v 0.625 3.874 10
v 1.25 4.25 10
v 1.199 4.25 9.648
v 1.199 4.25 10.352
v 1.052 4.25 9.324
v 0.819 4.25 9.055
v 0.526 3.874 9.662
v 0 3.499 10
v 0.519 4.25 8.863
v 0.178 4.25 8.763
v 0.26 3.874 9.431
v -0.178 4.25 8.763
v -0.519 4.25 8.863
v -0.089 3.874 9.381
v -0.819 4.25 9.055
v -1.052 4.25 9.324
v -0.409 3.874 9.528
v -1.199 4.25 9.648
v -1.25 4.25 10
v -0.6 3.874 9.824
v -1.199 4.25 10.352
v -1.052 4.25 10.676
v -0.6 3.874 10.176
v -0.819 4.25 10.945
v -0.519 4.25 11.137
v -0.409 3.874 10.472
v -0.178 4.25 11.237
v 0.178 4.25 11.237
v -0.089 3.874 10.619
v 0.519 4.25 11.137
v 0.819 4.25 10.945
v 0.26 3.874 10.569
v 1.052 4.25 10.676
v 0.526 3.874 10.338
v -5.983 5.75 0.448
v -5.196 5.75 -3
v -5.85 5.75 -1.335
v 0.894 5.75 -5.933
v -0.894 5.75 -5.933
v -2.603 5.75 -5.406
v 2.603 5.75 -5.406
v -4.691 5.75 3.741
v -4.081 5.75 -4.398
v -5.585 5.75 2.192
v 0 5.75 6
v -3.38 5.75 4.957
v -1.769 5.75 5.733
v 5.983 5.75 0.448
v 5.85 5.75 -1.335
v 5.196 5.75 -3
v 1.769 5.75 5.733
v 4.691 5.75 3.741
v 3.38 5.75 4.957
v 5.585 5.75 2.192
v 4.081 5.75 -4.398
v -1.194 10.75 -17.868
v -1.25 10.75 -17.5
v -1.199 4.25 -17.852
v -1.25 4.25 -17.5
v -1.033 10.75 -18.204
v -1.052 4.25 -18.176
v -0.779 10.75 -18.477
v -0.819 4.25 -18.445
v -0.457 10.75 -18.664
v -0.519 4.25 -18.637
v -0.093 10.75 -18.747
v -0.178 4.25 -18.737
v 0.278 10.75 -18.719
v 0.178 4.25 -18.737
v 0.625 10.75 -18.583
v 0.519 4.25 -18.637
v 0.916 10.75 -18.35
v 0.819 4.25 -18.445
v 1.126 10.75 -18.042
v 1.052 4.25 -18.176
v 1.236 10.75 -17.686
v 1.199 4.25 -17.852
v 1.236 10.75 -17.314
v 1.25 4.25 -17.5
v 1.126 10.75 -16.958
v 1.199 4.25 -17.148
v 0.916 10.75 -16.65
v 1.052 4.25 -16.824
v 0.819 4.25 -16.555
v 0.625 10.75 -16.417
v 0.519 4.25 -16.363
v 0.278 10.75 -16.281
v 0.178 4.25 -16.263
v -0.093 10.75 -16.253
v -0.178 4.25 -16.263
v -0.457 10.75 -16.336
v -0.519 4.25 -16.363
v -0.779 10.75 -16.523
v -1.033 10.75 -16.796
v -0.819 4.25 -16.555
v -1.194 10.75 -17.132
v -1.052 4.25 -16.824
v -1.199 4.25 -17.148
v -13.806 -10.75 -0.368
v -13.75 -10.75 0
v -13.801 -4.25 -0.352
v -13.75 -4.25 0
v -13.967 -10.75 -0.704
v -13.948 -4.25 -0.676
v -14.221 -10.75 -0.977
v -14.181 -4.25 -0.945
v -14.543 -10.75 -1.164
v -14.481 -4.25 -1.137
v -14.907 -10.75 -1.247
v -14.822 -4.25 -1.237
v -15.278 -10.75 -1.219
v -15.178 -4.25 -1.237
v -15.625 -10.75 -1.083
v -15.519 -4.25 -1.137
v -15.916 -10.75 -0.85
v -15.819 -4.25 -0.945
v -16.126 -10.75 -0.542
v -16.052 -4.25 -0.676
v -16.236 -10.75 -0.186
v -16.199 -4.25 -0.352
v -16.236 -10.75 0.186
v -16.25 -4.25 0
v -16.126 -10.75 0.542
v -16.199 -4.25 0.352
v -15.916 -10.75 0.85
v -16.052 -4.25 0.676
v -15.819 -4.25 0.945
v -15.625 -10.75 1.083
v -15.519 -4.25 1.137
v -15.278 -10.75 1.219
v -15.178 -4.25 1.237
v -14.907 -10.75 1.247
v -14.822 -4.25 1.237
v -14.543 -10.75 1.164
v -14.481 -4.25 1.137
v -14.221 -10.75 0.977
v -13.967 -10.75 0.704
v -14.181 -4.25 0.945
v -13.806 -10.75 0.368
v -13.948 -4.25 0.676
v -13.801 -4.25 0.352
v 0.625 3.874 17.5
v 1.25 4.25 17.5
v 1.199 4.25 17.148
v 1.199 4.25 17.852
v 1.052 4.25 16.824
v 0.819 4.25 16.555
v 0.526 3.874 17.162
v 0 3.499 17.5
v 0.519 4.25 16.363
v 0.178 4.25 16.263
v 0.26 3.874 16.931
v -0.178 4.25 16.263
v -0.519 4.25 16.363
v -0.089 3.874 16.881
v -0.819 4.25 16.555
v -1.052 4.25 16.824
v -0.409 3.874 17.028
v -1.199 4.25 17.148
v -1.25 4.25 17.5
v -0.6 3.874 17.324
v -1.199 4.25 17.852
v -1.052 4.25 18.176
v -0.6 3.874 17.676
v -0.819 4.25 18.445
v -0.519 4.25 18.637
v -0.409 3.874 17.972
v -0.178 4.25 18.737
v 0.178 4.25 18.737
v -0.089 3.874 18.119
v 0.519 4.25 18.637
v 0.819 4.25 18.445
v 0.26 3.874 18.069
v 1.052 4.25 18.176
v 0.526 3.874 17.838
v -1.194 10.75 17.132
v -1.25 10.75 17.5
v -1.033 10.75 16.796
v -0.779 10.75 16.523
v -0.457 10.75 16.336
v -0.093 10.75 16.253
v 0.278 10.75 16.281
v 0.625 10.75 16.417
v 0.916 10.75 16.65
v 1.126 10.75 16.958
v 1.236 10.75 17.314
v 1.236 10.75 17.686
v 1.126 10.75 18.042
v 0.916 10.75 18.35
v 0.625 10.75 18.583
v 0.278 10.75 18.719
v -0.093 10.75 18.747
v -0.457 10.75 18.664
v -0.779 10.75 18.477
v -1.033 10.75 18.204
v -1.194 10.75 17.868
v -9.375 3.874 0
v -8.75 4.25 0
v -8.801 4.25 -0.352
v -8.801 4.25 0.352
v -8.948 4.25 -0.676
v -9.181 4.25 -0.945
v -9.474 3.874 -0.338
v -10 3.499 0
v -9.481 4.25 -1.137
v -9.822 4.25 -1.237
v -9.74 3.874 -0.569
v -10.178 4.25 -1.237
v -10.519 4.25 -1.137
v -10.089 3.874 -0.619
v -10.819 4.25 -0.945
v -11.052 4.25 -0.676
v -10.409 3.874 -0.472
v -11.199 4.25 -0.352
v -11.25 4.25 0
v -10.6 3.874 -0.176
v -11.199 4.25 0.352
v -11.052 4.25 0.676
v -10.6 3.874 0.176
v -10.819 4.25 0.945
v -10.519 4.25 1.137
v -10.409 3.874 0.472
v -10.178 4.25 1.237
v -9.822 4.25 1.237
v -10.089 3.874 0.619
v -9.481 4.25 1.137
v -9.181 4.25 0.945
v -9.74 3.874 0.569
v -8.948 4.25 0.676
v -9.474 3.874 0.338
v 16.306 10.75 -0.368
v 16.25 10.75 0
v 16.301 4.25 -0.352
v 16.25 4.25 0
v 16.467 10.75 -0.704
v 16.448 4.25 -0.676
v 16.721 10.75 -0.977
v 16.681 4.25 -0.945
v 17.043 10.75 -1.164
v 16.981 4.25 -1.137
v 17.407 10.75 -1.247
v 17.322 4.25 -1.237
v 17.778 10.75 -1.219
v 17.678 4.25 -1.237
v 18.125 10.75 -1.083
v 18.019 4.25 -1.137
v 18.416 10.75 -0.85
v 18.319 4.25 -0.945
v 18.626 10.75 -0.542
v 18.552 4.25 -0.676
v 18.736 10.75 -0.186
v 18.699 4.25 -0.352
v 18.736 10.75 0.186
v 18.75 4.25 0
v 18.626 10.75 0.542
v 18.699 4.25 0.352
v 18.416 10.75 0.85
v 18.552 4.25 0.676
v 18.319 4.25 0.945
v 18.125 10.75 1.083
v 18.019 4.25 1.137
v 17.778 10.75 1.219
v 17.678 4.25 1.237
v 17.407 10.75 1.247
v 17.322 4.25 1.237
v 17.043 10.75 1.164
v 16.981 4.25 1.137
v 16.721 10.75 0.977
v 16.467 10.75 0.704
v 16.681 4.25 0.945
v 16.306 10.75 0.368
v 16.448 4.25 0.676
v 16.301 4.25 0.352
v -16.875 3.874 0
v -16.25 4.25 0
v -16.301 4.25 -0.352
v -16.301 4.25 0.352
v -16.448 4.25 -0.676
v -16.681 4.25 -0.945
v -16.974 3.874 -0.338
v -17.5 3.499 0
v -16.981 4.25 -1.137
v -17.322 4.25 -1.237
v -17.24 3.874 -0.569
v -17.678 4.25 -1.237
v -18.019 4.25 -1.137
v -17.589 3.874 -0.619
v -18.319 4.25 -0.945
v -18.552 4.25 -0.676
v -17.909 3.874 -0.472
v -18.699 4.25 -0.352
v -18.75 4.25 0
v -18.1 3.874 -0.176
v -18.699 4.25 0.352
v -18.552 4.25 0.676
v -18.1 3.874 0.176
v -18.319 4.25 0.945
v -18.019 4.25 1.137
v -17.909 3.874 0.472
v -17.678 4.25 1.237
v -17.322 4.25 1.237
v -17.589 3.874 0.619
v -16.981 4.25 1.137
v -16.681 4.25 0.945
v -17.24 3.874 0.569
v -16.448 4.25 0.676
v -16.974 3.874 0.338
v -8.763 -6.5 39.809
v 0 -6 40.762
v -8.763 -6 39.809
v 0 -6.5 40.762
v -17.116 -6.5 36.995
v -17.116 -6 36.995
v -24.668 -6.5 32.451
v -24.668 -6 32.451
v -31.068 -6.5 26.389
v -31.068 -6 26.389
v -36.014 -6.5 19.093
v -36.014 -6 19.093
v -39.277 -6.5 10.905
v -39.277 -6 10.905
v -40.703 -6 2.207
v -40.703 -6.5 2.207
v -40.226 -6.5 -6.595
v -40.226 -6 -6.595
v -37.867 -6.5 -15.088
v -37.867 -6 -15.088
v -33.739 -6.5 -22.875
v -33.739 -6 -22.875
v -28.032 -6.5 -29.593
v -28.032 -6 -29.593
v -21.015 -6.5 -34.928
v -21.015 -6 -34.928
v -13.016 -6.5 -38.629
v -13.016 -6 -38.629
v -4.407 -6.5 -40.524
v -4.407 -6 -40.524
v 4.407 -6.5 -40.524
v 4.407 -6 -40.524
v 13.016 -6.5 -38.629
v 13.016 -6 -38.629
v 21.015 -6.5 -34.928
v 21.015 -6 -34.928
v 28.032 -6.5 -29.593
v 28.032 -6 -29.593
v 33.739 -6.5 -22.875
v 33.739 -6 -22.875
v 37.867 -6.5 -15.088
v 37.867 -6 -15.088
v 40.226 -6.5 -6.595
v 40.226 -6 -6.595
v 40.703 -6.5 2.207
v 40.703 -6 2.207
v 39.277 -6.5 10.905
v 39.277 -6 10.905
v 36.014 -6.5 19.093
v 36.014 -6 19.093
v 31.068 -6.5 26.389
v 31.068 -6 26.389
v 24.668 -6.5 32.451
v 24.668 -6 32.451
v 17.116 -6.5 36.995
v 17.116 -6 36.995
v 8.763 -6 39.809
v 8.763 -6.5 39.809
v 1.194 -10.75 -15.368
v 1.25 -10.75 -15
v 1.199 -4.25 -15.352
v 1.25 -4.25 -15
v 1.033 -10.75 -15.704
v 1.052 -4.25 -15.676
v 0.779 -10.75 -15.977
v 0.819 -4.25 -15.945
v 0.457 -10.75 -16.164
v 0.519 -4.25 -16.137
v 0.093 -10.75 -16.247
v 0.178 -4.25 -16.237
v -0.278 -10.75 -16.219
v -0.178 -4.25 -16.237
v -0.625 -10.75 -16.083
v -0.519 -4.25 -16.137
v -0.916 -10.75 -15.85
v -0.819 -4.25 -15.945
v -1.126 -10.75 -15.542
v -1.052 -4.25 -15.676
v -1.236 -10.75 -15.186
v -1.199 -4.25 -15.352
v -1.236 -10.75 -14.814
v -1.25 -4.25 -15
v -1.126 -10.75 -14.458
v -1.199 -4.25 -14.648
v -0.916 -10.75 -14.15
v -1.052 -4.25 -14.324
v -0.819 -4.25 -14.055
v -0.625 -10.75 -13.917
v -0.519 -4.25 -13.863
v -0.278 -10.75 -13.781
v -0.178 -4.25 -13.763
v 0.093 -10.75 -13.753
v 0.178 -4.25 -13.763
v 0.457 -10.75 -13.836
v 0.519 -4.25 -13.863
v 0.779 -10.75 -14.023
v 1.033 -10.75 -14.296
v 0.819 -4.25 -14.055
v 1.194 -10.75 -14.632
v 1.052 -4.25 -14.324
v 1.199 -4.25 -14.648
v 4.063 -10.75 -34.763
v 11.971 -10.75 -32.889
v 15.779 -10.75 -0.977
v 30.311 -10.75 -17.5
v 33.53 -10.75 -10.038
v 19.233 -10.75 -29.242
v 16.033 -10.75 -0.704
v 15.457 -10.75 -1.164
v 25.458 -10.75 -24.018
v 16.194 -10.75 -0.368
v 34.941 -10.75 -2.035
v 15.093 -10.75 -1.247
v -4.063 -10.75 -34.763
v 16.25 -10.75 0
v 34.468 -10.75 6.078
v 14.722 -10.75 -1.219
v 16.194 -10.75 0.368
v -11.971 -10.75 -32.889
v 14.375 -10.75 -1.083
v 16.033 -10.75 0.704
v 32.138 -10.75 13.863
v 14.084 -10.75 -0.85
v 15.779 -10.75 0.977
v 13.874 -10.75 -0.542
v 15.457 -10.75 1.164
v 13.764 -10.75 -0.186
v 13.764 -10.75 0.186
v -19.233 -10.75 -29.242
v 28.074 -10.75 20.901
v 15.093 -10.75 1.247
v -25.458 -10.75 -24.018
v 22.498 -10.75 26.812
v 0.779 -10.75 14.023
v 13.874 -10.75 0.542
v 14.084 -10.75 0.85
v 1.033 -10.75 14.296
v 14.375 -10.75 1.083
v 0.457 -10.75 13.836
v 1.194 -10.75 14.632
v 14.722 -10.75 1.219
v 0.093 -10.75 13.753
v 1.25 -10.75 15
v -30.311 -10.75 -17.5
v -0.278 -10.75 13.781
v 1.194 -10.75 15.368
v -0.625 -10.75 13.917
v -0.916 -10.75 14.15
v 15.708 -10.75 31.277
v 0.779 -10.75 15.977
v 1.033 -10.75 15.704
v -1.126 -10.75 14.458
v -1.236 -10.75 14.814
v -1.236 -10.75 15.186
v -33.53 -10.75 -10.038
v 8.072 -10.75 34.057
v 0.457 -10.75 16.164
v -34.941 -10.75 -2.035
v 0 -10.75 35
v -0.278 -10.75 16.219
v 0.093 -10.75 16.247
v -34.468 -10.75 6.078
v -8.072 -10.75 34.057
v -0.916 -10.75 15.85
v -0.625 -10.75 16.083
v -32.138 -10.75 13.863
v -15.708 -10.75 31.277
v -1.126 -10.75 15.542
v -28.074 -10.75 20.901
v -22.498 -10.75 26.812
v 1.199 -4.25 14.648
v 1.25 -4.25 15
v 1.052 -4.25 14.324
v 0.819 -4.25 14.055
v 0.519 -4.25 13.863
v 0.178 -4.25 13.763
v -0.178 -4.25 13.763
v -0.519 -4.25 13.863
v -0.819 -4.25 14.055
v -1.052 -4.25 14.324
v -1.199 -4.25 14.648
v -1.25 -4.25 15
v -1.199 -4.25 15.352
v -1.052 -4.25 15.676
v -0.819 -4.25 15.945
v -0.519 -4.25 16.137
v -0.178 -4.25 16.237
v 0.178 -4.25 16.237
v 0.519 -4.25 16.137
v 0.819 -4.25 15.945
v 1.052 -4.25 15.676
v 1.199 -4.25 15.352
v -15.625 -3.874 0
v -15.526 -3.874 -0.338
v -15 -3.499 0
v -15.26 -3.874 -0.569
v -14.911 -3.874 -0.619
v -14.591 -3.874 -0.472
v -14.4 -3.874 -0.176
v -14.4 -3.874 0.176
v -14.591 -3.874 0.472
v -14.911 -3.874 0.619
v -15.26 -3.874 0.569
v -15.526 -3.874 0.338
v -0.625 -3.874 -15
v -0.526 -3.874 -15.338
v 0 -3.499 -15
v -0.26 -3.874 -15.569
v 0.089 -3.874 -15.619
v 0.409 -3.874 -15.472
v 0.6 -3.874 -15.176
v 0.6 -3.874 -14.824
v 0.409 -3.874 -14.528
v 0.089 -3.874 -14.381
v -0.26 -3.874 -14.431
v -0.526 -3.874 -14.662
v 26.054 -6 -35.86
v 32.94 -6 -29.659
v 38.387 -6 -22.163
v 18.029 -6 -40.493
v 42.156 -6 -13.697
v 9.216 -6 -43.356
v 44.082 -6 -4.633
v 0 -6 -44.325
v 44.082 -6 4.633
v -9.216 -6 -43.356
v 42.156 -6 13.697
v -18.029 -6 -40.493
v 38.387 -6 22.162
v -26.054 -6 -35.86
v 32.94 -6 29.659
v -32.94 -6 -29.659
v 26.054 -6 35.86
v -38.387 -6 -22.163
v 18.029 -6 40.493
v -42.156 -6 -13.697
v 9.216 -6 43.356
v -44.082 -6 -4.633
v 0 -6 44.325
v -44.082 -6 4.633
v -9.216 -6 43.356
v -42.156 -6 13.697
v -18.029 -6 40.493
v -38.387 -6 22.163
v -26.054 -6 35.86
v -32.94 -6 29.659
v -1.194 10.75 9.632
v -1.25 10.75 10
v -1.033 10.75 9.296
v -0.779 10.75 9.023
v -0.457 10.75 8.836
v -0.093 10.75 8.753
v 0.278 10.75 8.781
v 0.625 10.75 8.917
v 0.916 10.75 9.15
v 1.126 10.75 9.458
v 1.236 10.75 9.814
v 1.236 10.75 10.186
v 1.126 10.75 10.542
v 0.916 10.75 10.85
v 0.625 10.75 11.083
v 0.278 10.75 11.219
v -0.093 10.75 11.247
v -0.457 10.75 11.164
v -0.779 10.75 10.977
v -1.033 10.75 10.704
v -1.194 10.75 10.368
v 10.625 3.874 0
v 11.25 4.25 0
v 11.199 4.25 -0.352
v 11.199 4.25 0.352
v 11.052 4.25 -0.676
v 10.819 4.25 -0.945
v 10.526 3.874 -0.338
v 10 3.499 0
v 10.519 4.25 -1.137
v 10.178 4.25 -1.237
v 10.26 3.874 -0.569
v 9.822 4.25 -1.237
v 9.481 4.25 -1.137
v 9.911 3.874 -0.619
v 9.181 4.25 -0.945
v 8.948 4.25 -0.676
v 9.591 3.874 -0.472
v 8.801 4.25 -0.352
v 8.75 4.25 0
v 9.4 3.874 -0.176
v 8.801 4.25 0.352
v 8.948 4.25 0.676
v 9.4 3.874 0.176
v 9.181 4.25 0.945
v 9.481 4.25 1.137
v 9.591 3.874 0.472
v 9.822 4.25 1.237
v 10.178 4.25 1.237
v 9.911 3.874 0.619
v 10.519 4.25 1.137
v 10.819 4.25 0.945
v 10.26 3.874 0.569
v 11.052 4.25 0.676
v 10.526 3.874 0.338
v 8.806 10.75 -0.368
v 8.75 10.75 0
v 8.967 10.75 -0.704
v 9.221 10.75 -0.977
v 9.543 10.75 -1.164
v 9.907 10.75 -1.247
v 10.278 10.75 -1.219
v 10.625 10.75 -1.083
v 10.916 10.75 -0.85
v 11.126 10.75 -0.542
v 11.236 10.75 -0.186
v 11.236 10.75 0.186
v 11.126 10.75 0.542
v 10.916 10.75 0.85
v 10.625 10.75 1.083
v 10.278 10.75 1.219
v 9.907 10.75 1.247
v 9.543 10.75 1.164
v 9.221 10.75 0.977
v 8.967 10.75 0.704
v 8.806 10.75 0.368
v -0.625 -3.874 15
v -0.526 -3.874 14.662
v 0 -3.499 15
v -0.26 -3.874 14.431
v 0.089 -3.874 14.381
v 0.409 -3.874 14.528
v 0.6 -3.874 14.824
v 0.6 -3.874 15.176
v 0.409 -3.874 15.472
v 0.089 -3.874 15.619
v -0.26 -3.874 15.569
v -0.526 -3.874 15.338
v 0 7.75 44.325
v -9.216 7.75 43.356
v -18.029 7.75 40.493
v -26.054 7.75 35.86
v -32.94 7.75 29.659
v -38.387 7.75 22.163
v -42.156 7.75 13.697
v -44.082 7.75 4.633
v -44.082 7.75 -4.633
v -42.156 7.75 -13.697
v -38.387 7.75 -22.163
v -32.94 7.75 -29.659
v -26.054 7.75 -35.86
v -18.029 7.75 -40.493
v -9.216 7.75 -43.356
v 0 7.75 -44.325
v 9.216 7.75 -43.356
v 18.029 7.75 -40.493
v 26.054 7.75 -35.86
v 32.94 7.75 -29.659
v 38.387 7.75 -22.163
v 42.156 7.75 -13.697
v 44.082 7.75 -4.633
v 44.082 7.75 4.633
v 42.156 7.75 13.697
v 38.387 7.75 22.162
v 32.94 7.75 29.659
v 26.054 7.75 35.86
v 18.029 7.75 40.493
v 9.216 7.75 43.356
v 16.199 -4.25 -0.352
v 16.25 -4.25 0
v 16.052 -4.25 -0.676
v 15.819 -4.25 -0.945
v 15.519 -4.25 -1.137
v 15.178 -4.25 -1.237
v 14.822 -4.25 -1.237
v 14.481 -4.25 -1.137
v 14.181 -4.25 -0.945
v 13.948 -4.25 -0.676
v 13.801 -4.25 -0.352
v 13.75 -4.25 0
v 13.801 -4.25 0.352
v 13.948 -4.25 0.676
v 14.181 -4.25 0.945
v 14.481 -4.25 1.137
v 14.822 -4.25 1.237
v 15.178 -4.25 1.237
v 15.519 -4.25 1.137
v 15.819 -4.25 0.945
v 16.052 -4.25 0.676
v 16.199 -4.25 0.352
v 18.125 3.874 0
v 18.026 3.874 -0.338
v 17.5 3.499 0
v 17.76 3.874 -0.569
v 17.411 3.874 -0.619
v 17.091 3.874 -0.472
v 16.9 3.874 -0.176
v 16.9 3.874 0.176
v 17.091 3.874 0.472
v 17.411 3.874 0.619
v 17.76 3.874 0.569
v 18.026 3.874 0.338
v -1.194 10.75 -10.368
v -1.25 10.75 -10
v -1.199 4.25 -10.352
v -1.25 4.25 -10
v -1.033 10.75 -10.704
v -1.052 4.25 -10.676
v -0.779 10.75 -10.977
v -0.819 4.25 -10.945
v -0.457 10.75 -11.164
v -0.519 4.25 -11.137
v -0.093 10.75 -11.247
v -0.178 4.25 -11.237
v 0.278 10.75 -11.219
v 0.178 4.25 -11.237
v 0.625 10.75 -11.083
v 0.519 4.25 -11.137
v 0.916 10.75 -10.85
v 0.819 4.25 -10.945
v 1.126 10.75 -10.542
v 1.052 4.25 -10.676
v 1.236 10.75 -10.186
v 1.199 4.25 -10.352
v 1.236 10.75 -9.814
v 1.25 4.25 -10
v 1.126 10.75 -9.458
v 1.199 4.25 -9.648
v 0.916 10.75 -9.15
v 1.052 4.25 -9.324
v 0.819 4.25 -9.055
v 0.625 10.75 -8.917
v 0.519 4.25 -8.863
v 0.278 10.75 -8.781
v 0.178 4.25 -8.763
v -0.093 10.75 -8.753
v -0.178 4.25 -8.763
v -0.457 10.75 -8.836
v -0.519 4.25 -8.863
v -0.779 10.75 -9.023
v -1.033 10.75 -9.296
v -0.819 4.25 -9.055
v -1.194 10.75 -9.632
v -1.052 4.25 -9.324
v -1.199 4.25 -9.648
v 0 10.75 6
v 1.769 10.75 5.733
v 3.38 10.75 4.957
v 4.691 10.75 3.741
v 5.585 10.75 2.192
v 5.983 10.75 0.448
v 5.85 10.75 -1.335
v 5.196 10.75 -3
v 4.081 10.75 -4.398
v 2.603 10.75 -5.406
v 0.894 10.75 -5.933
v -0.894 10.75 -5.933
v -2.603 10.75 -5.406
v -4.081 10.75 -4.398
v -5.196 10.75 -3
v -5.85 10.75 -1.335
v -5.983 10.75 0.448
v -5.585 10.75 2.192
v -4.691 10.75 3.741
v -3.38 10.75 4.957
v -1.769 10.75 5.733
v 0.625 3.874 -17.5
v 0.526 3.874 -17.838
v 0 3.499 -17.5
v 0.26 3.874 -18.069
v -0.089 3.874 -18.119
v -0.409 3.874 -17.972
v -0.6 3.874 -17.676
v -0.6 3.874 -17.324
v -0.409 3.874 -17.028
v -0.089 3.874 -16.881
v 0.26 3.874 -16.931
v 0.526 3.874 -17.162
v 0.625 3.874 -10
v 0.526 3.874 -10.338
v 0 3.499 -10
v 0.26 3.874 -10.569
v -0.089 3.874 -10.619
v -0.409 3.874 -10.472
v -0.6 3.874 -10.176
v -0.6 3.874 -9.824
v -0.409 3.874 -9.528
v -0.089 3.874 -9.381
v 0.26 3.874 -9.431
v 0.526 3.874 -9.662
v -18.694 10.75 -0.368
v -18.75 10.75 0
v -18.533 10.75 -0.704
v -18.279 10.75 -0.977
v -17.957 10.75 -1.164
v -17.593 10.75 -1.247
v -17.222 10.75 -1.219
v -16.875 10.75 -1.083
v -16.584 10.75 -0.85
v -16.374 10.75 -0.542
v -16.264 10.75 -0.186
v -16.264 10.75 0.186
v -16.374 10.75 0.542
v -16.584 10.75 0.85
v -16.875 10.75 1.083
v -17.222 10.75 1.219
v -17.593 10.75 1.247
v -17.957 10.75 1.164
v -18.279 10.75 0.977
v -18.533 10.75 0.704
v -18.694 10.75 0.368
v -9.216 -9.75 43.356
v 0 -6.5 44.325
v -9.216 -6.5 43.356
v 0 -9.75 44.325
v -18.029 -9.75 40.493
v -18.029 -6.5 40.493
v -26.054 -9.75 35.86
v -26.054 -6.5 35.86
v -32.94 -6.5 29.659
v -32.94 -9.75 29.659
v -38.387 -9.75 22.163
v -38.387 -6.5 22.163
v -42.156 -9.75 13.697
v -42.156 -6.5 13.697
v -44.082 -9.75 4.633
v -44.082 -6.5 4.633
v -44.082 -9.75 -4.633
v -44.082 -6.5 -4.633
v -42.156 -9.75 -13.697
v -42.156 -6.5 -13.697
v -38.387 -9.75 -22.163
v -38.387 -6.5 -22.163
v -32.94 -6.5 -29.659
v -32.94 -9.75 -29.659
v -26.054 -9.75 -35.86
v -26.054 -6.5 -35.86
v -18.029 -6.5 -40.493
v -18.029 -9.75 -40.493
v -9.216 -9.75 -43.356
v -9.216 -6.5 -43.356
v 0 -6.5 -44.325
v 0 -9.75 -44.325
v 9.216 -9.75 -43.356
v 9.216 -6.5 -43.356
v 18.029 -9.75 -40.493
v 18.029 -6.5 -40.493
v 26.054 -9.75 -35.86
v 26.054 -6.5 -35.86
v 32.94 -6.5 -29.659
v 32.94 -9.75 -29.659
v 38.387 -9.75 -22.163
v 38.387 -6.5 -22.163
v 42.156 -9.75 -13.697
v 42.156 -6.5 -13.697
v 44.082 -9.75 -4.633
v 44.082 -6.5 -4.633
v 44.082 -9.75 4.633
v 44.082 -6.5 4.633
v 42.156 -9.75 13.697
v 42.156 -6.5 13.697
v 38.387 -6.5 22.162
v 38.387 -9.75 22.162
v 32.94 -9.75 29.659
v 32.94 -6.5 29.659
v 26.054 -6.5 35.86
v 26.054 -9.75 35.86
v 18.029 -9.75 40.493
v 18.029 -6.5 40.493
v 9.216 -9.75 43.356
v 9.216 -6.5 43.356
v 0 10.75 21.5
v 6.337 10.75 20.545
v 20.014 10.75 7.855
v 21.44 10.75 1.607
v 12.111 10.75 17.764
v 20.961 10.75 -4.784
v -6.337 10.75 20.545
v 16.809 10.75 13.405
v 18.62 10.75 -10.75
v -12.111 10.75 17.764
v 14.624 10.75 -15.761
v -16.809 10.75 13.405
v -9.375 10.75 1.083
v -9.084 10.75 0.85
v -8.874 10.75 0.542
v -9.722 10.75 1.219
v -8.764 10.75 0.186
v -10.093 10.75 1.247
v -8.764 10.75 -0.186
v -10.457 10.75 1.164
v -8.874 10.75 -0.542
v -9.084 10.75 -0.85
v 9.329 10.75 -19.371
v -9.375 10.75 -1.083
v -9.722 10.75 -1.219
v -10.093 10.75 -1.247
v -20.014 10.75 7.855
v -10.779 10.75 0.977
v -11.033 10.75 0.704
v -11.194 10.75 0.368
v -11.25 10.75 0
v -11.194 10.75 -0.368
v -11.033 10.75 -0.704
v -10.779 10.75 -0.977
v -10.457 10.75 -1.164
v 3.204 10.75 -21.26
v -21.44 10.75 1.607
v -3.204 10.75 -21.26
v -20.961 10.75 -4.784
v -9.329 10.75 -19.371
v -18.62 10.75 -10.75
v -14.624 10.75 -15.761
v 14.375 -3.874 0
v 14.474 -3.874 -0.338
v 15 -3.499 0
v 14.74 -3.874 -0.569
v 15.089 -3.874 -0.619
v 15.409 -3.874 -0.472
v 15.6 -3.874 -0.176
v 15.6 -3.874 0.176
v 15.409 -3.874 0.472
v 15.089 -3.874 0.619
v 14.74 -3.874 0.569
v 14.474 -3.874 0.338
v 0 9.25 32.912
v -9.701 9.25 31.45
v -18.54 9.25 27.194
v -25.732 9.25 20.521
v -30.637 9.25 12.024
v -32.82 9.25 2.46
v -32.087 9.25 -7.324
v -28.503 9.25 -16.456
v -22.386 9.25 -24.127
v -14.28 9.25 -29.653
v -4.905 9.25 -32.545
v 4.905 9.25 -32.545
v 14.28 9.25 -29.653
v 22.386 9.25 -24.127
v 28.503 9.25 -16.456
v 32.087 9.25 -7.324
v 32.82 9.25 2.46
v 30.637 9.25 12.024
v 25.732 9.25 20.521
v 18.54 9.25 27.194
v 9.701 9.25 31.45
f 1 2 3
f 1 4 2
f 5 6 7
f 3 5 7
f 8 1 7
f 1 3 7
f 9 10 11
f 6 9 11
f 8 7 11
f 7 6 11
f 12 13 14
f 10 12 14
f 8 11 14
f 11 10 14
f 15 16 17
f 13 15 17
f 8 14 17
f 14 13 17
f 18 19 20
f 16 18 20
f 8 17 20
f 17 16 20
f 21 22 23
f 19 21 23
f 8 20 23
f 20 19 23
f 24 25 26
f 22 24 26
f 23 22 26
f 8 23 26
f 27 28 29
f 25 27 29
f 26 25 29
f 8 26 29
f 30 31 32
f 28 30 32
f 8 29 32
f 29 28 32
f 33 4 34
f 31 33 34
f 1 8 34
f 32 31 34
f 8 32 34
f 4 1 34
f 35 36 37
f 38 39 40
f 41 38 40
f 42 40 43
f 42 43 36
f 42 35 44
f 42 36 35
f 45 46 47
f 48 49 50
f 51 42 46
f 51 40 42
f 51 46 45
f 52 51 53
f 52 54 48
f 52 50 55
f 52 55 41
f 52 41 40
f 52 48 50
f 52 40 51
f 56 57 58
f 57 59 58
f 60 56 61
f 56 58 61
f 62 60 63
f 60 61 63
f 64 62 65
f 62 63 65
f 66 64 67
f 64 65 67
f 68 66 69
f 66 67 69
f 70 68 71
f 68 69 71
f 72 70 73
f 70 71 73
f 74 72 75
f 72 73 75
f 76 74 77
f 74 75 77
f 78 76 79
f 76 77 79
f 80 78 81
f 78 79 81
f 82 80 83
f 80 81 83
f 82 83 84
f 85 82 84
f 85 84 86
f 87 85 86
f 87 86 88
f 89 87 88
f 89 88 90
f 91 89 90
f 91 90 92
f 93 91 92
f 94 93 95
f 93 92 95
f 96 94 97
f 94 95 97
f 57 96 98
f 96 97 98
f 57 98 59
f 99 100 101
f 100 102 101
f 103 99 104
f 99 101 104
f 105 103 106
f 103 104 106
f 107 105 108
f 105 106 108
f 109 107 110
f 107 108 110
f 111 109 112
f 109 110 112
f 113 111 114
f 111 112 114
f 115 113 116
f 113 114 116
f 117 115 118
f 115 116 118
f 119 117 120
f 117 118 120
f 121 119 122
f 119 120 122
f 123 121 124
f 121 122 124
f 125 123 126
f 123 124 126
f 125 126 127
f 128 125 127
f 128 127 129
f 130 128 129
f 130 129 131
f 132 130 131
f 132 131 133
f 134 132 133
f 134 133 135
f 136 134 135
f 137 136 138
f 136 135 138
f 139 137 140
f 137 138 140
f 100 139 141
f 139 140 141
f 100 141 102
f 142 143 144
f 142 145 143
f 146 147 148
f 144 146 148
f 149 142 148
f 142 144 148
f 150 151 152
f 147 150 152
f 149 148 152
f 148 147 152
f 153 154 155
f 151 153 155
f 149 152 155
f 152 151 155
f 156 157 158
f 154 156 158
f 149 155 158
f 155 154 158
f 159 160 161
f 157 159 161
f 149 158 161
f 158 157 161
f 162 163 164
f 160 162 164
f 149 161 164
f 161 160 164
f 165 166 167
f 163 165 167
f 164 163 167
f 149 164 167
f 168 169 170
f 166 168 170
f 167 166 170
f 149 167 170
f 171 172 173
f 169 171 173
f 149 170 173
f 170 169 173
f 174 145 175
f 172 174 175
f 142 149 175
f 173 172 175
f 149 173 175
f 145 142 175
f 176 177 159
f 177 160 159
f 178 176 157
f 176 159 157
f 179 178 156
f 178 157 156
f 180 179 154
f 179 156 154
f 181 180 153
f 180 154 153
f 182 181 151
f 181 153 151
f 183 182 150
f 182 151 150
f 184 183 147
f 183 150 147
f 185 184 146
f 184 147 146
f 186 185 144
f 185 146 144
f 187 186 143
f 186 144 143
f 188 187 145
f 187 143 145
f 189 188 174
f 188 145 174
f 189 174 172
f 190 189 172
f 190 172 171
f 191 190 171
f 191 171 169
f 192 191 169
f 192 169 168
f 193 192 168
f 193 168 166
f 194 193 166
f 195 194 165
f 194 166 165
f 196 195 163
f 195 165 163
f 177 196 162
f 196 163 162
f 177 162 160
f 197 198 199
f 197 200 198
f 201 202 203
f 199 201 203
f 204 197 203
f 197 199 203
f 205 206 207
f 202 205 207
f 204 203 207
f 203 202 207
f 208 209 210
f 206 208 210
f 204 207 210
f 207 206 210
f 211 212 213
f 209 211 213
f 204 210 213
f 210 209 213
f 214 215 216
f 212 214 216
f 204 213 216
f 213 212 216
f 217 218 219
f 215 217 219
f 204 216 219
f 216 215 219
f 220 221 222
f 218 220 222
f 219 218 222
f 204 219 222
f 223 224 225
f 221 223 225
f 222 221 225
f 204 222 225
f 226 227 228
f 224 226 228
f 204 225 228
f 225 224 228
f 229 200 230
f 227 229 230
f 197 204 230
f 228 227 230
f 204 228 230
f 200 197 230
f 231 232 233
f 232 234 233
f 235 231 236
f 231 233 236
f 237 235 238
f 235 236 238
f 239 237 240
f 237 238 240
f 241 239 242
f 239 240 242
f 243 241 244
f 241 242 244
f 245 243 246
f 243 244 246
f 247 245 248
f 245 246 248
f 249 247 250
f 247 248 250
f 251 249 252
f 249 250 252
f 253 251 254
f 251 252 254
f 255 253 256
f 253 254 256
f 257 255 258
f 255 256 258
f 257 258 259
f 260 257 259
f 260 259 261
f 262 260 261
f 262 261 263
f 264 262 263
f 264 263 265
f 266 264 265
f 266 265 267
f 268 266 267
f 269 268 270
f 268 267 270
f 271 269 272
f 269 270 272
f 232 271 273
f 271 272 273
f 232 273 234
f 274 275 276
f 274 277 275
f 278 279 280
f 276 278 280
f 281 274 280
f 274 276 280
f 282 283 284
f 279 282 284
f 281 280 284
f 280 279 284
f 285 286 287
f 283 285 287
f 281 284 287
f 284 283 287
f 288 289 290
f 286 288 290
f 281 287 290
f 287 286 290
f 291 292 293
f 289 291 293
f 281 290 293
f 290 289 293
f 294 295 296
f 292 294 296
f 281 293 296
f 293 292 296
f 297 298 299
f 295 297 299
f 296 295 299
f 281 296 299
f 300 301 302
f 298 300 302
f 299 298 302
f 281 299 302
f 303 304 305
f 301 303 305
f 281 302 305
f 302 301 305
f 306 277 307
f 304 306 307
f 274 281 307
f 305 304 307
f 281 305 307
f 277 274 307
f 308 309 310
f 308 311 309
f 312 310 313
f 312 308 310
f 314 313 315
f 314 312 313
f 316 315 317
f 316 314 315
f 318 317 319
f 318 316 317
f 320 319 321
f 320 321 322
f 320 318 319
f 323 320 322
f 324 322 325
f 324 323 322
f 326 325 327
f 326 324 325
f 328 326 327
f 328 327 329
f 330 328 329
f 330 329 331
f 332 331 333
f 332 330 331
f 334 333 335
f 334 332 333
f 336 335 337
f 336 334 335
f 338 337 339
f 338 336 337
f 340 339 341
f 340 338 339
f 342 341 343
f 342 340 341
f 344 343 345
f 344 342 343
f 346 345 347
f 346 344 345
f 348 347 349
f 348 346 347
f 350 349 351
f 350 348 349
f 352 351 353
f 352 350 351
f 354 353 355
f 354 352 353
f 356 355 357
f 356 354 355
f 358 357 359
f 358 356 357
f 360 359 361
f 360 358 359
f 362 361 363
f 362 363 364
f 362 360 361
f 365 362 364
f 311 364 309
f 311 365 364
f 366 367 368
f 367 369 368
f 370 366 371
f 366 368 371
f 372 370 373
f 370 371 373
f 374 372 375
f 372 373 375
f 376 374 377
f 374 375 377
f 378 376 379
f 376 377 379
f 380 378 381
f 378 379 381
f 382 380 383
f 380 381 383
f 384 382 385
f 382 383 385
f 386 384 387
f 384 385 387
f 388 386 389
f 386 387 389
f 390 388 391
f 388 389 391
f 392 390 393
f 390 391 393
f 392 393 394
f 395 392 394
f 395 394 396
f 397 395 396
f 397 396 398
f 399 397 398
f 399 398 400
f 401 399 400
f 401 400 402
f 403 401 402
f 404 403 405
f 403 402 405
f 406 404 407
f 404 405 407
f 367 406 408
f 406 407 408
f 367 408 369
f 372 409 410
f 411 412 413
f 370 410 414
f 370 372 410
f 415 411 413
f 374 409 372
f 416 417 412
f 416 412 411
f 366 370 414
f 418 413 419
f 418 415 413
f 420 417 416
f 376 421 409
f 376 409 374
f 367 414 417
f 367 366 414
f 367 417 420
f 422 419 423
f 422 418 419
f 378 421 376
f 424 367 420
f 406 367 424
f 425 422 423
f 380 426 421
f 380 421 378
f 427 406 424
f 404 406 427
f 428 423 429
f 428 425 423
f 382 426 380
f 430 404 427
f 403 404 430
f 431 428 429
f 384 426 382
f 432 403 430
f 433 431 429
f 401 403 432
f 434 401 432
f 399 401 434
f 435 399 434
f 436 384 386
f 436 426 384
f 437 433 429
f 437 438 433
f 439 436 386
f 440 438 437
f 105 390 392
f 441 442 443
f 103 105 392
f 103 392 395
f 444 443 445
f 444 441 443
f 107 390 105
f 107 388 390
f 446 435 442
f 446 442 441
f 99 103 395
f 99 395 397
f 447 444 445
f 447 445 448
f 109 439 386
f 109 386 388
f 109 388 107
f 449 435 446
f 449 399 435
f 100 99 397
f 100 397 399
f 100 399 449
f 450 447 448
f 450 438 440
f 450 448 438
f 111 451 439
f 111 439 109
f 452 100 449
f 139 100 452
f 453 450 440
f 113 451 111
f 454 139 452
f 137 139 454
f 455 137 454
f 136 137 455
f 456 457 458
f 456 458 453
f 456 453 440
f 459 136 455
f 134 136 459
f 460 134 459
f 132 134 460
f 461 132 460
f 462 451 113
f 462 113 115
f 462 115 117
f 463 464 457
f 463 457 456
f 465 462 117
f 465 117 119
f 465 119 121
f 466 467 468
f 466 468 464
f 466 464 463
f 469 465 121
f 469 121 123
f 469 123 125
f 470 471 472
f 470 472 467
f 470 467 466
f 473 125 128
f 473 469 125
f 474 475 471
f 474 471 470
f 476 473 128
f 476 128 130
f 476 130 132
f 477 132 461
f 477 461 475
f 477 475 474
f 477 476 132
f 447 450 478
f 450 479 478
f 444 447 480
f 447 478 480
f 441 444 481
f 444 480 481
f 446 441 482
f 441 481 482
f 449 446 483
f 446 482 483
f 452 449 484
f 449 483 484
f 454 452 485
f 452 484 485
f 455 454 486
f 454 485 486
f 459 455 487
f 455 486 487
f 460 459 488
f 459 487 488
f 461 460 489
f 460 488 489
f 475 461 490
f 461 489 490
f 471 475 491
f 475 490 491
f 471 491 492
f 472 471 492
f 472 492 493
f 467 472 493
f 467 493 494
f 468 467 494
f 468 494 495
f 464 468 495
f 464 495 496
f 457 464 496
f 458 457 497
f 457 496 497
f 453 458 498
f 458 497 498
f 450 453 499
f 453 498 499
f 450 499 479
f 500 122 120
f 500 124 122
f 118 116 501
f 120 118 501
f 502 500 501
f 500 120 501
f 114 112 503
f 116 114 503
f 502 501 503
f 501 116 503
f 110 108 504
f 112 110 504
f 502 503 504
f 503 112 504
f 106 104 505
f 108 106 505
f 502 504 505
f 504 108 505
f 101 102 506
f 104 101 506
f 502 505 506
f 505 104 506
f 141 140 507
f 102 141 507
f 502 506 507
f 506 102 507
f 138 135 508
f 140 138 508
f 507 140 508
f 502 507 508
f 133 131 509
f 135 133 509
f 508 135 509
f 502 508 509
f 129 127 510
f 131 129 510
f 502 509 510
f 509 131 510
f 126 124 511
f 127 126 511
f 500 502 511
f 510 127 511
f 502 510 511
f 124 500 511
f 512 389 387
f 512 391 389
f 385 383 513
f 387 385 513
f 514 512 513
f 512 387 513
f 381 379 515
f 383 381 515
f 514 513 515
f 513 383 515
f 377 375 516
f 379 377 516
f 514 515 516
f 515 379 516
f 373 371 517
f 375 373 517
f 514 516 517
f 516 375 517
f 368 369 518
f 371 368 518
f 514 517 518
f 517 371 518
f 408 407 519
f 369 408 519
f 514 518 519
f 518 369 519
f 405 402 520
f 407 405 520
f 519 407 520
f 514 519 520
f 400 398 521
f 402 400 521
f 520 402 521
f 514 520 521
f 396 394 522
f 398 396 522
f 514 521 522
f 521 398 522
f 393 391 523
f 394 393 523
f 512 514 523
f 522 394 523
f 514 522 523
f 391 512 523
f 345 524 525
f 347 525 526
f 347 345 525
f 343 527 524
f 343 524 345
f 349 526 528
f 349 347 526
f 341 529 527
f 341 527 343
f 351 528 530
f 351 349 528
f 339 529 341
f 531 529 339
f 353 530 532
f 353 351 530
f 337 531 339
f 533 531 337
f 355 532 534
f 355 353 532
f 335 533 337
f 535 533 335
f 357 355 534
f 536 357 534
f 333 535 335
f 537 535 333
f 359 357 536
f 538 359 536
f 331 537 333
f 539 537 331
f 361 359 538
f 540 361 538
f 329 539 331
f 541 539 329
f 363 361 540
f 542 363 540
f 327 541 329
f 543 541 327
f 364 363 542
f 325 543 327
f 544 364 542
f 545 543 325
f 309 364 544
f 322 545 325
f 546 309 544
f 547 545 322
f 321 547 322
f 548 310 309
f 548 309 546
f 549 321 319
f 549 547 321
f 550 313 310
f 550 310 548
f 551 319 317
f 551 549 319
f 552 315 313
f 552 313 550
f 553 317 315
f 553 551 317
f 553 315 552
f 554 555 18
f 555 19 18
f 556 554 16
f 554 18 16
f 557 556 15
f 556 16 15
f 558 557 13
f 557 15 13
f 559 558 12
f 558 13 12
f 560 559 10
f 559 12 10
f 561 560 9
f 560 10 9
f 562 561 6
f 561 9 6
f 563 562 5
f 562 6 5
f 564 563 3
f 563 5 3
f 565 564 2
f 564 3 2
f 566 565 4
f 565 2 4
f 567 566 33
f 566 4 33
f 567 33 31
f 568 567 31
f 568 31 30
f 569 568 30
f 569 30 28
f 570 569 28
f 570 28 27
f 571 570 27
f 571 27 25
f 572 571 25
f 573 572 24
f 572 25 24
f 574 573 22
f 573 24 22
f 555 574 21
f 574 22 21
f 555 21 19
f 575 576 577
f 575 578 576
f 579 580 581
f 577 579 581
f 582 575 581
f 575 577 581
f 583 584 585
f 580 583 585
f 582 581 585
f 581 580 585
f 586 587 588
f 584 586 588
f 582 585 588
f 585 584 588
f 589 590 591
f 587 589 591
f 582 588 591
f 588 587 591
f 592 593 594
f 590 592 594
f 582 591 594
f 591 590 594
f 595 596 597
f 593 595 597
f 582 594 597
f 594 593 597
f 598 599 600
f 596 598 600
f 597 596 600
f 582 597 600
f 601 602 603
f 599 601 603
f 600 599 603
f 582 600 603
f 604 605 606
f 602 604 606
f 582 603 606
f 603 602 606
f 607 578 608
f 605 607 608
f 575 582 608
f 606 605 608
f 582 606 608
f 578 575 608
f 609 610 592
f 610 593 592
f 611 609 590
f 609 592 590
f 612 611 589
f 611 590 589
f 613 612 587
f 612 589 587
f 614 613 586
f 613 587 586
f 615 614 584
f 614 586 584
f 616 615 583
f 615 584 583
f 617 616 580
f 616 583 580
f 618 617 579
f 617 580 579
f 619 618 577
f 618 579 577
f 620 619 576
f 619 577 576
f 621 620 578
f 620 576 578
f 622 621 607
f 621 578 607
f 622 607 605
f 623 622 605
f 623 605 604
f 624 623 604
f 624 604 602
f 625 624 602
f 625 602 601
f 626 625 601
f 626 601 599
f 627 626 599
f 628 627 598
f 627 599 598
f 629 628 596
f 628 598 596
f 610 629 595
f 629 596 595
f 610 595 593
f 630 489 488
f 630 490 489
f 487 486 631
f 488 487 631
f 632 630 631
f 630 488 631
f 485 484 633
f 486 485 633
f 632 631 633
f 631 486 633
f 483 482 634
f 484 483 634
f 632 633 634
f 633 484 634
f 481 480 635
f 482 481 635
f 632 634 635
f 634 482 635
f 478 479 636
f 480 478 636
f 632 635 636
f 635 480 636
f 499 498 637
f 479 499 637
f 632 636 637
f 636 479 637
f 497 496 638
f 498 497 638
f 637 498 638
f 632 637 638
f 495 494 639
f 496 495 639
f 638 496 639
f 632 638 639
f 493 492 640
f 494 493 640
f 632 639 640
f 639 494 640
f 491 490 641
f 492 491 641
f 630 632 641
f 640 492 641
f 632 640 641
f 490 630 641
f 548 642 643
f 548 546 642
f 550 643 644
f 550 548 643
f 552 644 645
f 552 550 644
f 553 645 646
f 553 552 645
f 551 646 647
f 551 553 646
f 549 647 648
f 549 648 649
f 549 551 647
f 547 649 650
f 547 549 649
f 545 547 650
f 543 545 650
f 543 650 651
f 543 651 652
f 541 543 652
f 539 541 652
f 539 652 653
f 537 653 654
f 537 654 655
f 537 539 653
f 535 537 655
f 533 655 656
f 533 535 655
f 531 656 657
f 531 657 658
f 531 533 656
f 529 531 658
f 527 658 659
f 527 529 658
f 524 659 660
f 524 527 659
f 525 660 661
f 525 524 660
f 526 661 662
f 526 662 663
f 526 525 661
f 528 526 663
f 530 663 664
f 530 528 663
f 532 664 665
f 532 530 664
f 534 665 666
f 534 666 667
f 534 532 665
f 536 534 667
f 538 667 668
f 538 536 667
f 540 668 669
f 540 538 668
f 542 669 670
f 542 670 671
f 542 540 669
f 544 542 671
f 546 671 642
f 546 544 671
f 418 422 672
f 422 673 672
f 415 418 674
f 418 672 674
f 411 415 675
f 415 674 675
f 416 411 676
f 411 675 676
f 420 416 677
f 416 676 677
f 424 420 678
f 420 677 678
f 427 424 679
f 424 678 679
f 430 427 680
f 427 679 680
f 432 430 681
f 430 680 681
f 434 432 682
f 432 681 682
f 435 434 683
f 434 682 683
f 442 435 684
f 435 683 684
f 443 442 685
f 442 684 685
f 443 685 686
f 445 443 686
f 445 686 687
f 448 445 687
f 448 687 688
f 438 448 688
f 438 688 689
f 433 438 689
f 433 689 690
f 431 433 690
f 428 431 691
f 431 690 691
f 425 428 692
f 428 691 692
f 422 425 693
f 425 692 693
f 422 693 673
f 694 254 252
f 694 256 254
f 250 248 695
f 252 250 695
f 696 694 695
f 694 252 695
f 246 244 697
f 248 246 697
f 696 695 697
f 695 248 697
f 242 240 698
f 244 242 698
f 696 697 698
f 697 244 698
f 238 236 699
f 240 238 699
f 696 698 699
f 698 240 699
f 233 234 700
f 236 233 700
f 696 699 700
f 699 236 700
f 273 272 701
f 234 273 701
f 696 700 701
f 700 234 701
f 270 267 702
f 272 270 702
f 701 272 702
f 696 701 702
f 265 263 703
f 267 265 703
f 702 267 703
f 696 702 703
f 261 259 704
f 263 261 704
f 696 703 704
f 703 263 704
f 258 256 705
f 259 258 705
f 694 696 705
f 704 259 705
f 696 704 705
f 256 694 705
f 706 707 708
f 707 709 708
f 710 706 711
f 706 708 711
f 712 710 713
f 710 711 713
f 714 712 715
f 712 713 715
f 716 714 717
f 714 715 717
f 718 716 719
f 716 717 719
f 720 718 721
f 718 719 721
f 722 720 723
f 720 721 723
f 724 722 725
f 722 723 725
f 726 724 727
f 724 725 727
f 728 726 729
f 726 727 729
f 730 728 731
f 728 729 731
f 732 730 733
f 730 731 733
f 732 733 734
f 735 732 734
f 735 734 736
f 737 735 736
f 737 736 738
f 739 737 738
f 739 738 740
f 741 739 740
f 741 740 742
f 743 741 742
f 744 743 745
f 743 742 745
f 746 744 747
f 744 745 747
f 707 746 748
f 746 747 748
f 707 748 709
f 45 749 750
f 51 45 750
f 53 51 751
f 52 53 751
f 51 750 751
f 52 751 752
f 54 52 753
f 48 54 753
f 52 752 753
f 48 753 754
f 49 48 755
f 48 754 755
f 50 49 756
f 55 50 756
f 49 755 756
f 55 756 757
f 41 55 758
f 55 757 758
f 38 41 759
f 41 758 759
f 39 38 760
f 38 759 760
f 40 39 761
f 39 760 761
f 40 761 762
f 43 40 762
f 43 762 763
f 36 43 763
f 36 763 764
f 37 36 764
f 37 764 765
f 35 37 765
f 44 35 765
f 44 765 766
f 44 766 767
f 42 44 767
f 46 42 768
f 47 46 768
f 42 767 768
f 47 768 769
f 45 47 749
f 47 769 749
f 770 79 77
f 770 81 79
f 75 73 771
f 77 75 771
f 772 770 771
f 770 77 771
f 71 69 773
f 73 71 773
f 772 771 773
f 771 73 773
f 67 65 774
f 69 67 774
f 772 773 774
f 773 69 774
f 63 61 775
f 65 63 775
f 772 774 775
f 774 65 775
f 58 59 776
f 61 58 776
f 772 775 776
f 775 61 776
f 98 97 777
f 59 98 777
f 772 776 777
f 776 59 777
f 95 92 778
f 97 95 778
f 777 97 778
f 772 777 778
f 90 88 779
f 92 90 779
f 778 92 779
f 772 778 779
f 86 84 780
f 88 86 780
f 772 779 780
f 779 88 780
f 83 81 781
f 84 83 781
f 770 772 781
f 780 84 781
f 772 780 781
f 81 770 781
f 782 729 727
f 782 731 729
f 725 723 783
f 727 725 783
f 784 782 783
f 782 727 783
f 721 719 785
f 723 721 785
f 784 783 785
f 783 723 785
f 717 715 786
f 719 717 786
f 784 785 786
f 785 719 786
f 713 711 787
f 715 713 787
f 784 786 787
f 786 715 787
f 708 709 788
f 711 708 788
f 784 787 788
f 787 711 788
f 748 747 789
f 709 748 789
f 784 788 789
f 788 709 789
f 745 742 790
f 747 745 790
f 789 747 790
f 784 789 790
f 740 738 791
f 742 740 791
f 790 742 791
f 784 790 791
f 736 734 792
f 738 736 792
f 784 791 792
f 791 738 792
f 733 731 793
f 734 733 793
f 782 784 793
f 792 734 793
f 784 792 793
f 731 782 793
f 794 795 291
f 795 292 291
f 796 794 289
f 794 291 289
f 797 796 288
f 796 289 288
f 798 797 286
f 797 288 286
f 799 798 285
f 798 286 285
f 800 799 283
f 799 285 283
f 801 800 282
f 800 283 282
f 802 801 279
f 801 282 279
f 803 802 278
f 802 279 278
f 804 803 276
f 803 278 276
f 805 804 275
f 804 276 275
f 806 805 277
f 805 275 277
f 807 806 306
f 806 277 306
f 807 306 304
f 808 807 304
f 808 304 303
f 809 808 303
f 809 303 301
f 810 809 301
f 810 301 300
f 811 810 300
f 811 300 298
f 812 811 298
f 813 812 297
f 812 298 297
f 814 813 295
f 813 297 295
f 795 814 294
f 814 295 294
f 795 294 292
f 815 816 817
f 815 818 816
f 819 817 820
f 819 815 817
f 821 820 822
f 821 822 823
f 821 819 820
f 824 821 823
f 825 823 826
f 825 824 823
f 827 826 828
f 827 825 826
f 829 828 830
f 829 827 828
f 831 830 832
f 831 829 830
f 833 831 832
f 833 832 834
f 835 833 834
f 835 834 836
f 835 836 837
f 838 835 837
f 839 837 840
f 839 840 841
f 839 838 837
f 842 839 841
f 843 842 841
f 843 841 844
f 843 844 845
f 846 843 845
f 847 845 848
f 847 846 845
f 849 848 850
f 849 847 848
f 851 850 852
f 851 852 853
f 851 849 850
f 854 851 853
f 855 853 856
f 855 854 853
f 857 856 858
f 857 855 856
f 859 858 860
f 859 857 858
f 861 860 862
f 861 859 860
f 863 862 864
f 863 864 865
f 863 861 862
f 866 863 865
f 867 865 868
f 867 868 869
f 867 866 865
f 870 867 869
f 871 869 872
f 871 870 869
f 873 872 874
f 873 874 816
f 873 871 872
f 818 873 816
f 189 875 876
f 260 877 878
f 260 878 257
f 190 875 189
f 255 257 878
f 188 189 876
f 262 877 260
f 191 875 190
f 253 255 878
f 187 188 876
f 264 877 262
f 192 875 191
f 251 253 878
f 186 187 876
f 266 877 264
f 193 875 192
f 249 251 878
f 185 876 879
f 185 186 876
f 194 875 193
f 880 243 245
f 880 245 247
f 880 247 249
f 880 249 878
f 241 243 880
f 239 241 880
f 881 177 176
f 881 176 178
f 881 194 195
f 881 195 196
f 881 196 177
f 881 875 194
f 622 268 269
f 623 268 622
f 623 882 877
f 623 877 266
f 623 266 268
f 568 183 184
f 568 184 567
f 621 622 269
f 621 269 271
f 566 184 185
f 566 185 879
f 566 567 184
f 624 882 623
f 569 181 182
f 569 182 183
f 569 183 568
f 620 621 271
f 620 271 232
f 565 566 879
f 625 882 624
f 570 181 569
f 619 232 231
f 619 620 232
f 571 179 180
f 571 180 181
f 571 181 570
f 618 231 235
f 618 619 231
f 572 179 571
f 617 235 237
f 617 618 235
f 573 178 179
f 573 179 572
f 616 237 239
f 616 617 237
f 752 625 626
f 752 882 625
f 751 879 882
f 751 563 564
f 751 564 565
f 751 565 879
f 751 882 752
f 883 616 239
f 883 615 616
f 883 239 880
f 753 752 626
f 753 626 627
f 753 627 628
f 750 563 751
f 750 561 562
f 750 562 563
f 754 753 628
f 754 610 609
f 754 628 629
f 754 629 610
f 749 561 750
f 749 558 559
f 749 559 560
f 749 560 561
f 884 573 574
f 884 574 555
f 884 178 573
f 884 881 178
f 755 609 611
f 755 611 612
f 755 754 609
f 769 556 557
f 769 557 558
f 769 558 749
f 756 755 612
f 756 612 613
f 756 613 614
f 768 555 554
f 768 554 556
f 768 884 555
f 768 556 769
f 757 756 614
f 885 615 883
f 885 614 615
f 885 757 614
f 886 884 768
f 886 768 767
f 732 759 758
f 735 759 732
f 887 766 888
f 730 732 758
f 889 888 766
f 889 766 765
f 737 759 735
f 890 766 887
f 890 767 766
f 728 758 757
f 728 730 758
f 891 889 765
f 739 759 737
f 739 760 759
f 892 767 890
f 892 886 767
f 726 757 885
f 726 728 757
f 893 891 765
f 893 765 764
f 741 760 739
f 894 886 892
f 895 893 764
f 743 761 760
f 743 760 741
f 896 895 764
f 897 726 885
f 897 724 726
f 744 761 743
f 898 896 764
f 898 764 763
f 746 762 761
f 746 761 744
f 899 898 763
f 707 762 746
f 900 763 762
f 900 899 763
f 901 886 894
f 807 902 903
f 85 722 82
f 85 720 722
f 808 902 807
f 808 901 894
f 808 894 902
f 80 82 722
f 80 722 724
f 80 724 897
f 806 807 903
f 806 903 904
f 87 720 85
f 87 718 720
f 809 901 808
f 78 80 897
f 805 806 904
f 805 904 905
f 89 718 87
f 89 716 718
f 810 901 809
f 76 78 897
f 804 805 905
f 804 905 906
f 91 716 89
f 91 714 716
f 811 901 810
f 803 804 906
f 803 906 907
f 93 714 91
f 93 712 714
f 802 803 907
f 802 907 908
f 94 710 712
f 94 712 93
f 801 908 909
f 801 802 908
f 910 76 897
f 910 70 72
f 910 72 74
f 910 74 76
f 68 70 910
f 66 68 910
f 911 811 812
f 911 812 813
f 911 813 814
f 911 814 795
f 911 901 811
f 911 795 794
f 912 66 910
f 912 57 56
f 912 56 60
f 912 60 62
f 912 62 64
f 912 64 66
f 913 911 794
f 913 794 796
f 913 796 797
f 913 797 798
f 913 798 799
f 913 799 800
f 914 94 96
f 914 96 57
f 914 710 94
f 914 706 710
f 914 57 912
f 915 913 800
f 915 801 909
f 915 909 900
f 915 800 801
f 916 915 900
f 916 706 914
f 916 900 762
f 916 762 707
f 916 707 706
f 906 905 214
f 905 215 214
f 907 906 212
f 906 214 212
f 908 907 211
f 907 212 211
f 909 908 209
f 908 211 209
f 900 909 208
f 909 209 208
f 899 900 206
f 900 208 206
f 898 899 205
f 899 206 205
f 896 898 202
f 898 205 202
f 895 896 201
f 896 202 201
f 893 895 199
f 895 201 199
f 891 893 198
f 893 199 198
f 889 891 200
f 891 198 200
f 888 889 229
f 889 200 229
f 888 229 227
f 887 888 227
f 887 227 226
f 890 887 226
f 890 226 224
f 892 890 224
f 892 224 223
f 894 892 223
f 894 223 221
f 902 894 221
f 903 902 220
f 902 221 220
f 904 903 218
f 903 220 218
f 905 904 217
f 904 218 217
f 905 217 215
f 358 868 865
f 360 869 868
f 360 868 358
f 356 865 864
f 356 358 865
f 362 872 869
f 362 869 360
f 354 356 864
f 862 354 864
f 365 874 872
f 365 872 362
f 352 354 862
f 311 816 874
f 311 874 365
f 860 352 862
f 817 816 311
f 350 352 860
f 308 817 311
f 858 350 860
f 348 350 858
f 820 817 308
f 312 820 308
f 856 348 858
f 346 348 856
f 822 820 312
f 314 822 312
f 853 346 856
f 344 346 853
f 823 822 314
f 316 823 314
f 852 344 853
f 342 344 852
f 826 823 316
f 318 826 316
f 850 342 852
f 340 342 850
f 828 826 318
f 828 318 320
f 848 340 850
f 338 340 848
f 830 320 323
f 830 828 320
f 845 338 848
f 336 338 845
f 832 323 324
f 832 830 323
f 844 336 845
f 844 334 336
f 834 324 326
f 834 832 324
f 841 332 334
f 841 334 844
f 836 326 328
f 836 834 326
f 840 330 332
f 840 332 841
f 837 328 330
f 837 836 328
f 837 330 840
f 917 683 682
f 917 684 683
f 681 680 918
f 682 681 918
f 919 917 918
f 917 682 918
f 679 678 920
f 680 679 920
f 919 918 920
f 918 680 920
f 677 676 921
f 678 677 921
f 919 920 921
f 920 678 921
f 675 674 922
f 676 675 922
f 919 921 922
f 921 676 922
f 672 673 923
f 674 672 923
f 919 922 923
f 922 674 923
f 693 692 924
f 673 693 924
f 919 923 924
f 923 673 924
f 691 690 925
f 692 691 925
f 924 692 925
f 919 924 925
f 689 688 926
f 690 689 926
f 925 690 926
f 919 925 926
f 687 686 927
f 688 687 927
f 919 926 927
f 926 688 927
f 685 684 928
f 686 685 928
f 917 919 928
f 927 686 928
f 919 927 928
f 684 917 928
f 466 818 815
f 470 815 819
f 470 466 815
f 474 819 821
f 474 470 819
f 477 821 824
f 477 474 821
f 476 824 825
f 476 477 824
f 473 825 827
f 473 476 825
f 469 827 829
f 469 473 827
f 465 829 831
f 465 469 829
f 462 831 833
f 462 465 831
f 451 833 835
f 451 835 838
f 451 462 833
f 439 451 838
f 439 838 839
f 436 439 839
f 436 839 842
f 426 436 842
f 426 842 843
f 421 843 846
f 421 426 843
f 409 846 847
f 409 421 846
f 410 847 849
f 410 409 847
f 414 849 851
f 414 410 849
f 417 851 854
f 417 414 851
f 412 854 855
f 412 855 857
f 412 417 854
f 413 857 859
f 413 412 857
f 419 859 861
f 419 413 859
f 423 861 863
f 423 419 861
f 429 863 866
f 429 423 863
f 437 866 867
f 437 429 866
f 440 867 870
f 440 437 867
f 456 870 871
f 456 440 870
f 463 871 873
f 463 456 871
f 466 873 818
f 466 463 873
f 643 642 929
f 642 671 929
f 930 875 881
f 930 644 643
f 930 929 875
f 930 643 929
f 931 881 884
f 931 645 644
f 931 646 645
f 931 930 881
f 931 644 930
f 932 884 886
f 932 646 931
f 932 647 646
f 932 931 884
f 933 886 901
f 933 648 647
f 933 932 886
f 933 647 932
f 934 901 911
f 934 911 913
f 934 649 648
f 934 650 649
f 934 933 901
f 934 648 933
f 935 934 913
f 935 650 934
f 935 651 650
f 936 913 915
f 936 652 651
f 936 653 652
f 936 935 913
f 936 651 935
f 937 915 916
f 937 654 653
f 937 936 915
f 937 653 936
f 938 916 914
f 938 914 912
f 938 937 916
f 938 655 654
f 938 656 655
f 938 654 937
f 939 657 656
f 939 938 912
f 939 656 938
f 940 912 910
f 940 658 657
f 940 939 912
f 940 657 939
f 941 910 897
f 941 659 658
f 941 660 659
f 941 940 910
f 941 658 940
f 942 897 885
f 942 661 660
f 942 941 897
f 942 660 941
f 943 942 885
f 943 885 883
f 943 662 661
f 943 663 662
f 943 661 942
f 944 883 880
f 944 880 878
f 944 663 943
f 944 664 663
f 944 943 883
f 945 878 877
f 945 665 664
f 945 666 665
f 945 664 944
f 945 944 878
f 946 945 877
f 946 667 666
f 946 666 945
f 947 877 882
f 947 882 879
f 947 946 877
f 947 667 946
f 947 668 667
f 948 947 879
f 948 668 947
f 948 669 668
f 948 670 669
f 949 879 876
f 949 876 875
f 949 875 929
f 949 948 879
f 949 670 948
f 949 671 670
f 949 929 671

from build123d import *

# Parameters (mm, degrees)
M3X0_5_TAPPED_HOLE1_D     = 2.5
M3X0_5_TAPPED_HOLE1_DEPTH = 6.5
M3X0_5_TAPPED_HOLE1_TIP   = 0.751075774
SKETCH4_R                 = 6
CUT_EXTRUDE1_DEPTH        = 5
M3X0_5_TAPPED_HOLE2_D     = 2.5
M3X0_5_TAPPED_HOLE2_DEPTH = 6.5
M3X0_5_TAPPED_HOLE2_TIP   = 0.751075774


with BuildPart() as part:
    # Sketch1 → Revolve1 (revolve)
    with BuildSketch(Plane.XY):
        Polygon((0, -10.75), (0, 10.75), (-21.5, 10.75), (-44.325, 7.75), (-44.325, -6), (-40.7625, -6), (-40.7625, -6.5), (-44.325, -6.5), (-44.325, -9.75), (-35, -10.75), align=None)
    revolve(axis=Axis((0, 0, 0), (0, -1, 0)))

    # M3x0.5 Tapped Hole1
    with Locations(Plane(origin=(0, 10.75, 0), x_dir=(1, 0, 0), z_dir=(0, 1, 0))):
        with Locations((0, 17.5), (0, 10), (17.5, 0), (10, 0), (0, -17.5), (0, -10), (-17.5, 0), (-10, 0)):
            Hole(M3X0_5_TAPPED_HOLE1_D / 2, depth=M3X0_5_TAPPED_HOLE1_DEPTH)
            with Locations((0, 0, -(M3X0_5_TAPPED_HOLE1_DEPTH + M3X0_5_TAPPED_HOLE1_TIP / 2))):  # 118° drill point
                Cone(0, M3X0_5_TAPPED_HOLE1_D / 2, M3X0_5_TAPPED_HOLE1_TIP, mode=Mode.SUBTRACT)

    # Sketch4 → Cut-Extrude1 (cut)
    with BuildSketch(Plane(origin=(0, 10.75, 0), x_dir=(1, 0, 0), z_dir=(0, 1, 0))):
        Circle(SKETCH4_R)
    extrude(amount=-CUT_EXTRUDE1_DEPTH, mode=Mode.SUBTRACT)

    # M3x0.5 Tapped Hole2
    with Locations(Plane(origin=(0, -10.75, 0), x_dir=(-1, 0, 0), z_dir=(0, -1, 0))):
        with Locations((0, 15), (15, 0), (0, -15), (-15, 0)):
            Hole(M3X0_5_TAPPED_HOLE2_D / 2, depth=M3X0_5_TAPPED_HOLE2_DEPTH)
            with Locations((0, 0, -(M3X0_5_TAPPED_HOLE2_DEPTH + M3X0_5_TAPPED_HOLE2_TIP / 2))):  # 118° drill point
                Cone(0, M3X0_5_TAPPED_HOLE2_D / 2, M3X0_5_TAPPED_HOLE2_TIP, mode=Mode.SUBTRACT)


solid = part.part
